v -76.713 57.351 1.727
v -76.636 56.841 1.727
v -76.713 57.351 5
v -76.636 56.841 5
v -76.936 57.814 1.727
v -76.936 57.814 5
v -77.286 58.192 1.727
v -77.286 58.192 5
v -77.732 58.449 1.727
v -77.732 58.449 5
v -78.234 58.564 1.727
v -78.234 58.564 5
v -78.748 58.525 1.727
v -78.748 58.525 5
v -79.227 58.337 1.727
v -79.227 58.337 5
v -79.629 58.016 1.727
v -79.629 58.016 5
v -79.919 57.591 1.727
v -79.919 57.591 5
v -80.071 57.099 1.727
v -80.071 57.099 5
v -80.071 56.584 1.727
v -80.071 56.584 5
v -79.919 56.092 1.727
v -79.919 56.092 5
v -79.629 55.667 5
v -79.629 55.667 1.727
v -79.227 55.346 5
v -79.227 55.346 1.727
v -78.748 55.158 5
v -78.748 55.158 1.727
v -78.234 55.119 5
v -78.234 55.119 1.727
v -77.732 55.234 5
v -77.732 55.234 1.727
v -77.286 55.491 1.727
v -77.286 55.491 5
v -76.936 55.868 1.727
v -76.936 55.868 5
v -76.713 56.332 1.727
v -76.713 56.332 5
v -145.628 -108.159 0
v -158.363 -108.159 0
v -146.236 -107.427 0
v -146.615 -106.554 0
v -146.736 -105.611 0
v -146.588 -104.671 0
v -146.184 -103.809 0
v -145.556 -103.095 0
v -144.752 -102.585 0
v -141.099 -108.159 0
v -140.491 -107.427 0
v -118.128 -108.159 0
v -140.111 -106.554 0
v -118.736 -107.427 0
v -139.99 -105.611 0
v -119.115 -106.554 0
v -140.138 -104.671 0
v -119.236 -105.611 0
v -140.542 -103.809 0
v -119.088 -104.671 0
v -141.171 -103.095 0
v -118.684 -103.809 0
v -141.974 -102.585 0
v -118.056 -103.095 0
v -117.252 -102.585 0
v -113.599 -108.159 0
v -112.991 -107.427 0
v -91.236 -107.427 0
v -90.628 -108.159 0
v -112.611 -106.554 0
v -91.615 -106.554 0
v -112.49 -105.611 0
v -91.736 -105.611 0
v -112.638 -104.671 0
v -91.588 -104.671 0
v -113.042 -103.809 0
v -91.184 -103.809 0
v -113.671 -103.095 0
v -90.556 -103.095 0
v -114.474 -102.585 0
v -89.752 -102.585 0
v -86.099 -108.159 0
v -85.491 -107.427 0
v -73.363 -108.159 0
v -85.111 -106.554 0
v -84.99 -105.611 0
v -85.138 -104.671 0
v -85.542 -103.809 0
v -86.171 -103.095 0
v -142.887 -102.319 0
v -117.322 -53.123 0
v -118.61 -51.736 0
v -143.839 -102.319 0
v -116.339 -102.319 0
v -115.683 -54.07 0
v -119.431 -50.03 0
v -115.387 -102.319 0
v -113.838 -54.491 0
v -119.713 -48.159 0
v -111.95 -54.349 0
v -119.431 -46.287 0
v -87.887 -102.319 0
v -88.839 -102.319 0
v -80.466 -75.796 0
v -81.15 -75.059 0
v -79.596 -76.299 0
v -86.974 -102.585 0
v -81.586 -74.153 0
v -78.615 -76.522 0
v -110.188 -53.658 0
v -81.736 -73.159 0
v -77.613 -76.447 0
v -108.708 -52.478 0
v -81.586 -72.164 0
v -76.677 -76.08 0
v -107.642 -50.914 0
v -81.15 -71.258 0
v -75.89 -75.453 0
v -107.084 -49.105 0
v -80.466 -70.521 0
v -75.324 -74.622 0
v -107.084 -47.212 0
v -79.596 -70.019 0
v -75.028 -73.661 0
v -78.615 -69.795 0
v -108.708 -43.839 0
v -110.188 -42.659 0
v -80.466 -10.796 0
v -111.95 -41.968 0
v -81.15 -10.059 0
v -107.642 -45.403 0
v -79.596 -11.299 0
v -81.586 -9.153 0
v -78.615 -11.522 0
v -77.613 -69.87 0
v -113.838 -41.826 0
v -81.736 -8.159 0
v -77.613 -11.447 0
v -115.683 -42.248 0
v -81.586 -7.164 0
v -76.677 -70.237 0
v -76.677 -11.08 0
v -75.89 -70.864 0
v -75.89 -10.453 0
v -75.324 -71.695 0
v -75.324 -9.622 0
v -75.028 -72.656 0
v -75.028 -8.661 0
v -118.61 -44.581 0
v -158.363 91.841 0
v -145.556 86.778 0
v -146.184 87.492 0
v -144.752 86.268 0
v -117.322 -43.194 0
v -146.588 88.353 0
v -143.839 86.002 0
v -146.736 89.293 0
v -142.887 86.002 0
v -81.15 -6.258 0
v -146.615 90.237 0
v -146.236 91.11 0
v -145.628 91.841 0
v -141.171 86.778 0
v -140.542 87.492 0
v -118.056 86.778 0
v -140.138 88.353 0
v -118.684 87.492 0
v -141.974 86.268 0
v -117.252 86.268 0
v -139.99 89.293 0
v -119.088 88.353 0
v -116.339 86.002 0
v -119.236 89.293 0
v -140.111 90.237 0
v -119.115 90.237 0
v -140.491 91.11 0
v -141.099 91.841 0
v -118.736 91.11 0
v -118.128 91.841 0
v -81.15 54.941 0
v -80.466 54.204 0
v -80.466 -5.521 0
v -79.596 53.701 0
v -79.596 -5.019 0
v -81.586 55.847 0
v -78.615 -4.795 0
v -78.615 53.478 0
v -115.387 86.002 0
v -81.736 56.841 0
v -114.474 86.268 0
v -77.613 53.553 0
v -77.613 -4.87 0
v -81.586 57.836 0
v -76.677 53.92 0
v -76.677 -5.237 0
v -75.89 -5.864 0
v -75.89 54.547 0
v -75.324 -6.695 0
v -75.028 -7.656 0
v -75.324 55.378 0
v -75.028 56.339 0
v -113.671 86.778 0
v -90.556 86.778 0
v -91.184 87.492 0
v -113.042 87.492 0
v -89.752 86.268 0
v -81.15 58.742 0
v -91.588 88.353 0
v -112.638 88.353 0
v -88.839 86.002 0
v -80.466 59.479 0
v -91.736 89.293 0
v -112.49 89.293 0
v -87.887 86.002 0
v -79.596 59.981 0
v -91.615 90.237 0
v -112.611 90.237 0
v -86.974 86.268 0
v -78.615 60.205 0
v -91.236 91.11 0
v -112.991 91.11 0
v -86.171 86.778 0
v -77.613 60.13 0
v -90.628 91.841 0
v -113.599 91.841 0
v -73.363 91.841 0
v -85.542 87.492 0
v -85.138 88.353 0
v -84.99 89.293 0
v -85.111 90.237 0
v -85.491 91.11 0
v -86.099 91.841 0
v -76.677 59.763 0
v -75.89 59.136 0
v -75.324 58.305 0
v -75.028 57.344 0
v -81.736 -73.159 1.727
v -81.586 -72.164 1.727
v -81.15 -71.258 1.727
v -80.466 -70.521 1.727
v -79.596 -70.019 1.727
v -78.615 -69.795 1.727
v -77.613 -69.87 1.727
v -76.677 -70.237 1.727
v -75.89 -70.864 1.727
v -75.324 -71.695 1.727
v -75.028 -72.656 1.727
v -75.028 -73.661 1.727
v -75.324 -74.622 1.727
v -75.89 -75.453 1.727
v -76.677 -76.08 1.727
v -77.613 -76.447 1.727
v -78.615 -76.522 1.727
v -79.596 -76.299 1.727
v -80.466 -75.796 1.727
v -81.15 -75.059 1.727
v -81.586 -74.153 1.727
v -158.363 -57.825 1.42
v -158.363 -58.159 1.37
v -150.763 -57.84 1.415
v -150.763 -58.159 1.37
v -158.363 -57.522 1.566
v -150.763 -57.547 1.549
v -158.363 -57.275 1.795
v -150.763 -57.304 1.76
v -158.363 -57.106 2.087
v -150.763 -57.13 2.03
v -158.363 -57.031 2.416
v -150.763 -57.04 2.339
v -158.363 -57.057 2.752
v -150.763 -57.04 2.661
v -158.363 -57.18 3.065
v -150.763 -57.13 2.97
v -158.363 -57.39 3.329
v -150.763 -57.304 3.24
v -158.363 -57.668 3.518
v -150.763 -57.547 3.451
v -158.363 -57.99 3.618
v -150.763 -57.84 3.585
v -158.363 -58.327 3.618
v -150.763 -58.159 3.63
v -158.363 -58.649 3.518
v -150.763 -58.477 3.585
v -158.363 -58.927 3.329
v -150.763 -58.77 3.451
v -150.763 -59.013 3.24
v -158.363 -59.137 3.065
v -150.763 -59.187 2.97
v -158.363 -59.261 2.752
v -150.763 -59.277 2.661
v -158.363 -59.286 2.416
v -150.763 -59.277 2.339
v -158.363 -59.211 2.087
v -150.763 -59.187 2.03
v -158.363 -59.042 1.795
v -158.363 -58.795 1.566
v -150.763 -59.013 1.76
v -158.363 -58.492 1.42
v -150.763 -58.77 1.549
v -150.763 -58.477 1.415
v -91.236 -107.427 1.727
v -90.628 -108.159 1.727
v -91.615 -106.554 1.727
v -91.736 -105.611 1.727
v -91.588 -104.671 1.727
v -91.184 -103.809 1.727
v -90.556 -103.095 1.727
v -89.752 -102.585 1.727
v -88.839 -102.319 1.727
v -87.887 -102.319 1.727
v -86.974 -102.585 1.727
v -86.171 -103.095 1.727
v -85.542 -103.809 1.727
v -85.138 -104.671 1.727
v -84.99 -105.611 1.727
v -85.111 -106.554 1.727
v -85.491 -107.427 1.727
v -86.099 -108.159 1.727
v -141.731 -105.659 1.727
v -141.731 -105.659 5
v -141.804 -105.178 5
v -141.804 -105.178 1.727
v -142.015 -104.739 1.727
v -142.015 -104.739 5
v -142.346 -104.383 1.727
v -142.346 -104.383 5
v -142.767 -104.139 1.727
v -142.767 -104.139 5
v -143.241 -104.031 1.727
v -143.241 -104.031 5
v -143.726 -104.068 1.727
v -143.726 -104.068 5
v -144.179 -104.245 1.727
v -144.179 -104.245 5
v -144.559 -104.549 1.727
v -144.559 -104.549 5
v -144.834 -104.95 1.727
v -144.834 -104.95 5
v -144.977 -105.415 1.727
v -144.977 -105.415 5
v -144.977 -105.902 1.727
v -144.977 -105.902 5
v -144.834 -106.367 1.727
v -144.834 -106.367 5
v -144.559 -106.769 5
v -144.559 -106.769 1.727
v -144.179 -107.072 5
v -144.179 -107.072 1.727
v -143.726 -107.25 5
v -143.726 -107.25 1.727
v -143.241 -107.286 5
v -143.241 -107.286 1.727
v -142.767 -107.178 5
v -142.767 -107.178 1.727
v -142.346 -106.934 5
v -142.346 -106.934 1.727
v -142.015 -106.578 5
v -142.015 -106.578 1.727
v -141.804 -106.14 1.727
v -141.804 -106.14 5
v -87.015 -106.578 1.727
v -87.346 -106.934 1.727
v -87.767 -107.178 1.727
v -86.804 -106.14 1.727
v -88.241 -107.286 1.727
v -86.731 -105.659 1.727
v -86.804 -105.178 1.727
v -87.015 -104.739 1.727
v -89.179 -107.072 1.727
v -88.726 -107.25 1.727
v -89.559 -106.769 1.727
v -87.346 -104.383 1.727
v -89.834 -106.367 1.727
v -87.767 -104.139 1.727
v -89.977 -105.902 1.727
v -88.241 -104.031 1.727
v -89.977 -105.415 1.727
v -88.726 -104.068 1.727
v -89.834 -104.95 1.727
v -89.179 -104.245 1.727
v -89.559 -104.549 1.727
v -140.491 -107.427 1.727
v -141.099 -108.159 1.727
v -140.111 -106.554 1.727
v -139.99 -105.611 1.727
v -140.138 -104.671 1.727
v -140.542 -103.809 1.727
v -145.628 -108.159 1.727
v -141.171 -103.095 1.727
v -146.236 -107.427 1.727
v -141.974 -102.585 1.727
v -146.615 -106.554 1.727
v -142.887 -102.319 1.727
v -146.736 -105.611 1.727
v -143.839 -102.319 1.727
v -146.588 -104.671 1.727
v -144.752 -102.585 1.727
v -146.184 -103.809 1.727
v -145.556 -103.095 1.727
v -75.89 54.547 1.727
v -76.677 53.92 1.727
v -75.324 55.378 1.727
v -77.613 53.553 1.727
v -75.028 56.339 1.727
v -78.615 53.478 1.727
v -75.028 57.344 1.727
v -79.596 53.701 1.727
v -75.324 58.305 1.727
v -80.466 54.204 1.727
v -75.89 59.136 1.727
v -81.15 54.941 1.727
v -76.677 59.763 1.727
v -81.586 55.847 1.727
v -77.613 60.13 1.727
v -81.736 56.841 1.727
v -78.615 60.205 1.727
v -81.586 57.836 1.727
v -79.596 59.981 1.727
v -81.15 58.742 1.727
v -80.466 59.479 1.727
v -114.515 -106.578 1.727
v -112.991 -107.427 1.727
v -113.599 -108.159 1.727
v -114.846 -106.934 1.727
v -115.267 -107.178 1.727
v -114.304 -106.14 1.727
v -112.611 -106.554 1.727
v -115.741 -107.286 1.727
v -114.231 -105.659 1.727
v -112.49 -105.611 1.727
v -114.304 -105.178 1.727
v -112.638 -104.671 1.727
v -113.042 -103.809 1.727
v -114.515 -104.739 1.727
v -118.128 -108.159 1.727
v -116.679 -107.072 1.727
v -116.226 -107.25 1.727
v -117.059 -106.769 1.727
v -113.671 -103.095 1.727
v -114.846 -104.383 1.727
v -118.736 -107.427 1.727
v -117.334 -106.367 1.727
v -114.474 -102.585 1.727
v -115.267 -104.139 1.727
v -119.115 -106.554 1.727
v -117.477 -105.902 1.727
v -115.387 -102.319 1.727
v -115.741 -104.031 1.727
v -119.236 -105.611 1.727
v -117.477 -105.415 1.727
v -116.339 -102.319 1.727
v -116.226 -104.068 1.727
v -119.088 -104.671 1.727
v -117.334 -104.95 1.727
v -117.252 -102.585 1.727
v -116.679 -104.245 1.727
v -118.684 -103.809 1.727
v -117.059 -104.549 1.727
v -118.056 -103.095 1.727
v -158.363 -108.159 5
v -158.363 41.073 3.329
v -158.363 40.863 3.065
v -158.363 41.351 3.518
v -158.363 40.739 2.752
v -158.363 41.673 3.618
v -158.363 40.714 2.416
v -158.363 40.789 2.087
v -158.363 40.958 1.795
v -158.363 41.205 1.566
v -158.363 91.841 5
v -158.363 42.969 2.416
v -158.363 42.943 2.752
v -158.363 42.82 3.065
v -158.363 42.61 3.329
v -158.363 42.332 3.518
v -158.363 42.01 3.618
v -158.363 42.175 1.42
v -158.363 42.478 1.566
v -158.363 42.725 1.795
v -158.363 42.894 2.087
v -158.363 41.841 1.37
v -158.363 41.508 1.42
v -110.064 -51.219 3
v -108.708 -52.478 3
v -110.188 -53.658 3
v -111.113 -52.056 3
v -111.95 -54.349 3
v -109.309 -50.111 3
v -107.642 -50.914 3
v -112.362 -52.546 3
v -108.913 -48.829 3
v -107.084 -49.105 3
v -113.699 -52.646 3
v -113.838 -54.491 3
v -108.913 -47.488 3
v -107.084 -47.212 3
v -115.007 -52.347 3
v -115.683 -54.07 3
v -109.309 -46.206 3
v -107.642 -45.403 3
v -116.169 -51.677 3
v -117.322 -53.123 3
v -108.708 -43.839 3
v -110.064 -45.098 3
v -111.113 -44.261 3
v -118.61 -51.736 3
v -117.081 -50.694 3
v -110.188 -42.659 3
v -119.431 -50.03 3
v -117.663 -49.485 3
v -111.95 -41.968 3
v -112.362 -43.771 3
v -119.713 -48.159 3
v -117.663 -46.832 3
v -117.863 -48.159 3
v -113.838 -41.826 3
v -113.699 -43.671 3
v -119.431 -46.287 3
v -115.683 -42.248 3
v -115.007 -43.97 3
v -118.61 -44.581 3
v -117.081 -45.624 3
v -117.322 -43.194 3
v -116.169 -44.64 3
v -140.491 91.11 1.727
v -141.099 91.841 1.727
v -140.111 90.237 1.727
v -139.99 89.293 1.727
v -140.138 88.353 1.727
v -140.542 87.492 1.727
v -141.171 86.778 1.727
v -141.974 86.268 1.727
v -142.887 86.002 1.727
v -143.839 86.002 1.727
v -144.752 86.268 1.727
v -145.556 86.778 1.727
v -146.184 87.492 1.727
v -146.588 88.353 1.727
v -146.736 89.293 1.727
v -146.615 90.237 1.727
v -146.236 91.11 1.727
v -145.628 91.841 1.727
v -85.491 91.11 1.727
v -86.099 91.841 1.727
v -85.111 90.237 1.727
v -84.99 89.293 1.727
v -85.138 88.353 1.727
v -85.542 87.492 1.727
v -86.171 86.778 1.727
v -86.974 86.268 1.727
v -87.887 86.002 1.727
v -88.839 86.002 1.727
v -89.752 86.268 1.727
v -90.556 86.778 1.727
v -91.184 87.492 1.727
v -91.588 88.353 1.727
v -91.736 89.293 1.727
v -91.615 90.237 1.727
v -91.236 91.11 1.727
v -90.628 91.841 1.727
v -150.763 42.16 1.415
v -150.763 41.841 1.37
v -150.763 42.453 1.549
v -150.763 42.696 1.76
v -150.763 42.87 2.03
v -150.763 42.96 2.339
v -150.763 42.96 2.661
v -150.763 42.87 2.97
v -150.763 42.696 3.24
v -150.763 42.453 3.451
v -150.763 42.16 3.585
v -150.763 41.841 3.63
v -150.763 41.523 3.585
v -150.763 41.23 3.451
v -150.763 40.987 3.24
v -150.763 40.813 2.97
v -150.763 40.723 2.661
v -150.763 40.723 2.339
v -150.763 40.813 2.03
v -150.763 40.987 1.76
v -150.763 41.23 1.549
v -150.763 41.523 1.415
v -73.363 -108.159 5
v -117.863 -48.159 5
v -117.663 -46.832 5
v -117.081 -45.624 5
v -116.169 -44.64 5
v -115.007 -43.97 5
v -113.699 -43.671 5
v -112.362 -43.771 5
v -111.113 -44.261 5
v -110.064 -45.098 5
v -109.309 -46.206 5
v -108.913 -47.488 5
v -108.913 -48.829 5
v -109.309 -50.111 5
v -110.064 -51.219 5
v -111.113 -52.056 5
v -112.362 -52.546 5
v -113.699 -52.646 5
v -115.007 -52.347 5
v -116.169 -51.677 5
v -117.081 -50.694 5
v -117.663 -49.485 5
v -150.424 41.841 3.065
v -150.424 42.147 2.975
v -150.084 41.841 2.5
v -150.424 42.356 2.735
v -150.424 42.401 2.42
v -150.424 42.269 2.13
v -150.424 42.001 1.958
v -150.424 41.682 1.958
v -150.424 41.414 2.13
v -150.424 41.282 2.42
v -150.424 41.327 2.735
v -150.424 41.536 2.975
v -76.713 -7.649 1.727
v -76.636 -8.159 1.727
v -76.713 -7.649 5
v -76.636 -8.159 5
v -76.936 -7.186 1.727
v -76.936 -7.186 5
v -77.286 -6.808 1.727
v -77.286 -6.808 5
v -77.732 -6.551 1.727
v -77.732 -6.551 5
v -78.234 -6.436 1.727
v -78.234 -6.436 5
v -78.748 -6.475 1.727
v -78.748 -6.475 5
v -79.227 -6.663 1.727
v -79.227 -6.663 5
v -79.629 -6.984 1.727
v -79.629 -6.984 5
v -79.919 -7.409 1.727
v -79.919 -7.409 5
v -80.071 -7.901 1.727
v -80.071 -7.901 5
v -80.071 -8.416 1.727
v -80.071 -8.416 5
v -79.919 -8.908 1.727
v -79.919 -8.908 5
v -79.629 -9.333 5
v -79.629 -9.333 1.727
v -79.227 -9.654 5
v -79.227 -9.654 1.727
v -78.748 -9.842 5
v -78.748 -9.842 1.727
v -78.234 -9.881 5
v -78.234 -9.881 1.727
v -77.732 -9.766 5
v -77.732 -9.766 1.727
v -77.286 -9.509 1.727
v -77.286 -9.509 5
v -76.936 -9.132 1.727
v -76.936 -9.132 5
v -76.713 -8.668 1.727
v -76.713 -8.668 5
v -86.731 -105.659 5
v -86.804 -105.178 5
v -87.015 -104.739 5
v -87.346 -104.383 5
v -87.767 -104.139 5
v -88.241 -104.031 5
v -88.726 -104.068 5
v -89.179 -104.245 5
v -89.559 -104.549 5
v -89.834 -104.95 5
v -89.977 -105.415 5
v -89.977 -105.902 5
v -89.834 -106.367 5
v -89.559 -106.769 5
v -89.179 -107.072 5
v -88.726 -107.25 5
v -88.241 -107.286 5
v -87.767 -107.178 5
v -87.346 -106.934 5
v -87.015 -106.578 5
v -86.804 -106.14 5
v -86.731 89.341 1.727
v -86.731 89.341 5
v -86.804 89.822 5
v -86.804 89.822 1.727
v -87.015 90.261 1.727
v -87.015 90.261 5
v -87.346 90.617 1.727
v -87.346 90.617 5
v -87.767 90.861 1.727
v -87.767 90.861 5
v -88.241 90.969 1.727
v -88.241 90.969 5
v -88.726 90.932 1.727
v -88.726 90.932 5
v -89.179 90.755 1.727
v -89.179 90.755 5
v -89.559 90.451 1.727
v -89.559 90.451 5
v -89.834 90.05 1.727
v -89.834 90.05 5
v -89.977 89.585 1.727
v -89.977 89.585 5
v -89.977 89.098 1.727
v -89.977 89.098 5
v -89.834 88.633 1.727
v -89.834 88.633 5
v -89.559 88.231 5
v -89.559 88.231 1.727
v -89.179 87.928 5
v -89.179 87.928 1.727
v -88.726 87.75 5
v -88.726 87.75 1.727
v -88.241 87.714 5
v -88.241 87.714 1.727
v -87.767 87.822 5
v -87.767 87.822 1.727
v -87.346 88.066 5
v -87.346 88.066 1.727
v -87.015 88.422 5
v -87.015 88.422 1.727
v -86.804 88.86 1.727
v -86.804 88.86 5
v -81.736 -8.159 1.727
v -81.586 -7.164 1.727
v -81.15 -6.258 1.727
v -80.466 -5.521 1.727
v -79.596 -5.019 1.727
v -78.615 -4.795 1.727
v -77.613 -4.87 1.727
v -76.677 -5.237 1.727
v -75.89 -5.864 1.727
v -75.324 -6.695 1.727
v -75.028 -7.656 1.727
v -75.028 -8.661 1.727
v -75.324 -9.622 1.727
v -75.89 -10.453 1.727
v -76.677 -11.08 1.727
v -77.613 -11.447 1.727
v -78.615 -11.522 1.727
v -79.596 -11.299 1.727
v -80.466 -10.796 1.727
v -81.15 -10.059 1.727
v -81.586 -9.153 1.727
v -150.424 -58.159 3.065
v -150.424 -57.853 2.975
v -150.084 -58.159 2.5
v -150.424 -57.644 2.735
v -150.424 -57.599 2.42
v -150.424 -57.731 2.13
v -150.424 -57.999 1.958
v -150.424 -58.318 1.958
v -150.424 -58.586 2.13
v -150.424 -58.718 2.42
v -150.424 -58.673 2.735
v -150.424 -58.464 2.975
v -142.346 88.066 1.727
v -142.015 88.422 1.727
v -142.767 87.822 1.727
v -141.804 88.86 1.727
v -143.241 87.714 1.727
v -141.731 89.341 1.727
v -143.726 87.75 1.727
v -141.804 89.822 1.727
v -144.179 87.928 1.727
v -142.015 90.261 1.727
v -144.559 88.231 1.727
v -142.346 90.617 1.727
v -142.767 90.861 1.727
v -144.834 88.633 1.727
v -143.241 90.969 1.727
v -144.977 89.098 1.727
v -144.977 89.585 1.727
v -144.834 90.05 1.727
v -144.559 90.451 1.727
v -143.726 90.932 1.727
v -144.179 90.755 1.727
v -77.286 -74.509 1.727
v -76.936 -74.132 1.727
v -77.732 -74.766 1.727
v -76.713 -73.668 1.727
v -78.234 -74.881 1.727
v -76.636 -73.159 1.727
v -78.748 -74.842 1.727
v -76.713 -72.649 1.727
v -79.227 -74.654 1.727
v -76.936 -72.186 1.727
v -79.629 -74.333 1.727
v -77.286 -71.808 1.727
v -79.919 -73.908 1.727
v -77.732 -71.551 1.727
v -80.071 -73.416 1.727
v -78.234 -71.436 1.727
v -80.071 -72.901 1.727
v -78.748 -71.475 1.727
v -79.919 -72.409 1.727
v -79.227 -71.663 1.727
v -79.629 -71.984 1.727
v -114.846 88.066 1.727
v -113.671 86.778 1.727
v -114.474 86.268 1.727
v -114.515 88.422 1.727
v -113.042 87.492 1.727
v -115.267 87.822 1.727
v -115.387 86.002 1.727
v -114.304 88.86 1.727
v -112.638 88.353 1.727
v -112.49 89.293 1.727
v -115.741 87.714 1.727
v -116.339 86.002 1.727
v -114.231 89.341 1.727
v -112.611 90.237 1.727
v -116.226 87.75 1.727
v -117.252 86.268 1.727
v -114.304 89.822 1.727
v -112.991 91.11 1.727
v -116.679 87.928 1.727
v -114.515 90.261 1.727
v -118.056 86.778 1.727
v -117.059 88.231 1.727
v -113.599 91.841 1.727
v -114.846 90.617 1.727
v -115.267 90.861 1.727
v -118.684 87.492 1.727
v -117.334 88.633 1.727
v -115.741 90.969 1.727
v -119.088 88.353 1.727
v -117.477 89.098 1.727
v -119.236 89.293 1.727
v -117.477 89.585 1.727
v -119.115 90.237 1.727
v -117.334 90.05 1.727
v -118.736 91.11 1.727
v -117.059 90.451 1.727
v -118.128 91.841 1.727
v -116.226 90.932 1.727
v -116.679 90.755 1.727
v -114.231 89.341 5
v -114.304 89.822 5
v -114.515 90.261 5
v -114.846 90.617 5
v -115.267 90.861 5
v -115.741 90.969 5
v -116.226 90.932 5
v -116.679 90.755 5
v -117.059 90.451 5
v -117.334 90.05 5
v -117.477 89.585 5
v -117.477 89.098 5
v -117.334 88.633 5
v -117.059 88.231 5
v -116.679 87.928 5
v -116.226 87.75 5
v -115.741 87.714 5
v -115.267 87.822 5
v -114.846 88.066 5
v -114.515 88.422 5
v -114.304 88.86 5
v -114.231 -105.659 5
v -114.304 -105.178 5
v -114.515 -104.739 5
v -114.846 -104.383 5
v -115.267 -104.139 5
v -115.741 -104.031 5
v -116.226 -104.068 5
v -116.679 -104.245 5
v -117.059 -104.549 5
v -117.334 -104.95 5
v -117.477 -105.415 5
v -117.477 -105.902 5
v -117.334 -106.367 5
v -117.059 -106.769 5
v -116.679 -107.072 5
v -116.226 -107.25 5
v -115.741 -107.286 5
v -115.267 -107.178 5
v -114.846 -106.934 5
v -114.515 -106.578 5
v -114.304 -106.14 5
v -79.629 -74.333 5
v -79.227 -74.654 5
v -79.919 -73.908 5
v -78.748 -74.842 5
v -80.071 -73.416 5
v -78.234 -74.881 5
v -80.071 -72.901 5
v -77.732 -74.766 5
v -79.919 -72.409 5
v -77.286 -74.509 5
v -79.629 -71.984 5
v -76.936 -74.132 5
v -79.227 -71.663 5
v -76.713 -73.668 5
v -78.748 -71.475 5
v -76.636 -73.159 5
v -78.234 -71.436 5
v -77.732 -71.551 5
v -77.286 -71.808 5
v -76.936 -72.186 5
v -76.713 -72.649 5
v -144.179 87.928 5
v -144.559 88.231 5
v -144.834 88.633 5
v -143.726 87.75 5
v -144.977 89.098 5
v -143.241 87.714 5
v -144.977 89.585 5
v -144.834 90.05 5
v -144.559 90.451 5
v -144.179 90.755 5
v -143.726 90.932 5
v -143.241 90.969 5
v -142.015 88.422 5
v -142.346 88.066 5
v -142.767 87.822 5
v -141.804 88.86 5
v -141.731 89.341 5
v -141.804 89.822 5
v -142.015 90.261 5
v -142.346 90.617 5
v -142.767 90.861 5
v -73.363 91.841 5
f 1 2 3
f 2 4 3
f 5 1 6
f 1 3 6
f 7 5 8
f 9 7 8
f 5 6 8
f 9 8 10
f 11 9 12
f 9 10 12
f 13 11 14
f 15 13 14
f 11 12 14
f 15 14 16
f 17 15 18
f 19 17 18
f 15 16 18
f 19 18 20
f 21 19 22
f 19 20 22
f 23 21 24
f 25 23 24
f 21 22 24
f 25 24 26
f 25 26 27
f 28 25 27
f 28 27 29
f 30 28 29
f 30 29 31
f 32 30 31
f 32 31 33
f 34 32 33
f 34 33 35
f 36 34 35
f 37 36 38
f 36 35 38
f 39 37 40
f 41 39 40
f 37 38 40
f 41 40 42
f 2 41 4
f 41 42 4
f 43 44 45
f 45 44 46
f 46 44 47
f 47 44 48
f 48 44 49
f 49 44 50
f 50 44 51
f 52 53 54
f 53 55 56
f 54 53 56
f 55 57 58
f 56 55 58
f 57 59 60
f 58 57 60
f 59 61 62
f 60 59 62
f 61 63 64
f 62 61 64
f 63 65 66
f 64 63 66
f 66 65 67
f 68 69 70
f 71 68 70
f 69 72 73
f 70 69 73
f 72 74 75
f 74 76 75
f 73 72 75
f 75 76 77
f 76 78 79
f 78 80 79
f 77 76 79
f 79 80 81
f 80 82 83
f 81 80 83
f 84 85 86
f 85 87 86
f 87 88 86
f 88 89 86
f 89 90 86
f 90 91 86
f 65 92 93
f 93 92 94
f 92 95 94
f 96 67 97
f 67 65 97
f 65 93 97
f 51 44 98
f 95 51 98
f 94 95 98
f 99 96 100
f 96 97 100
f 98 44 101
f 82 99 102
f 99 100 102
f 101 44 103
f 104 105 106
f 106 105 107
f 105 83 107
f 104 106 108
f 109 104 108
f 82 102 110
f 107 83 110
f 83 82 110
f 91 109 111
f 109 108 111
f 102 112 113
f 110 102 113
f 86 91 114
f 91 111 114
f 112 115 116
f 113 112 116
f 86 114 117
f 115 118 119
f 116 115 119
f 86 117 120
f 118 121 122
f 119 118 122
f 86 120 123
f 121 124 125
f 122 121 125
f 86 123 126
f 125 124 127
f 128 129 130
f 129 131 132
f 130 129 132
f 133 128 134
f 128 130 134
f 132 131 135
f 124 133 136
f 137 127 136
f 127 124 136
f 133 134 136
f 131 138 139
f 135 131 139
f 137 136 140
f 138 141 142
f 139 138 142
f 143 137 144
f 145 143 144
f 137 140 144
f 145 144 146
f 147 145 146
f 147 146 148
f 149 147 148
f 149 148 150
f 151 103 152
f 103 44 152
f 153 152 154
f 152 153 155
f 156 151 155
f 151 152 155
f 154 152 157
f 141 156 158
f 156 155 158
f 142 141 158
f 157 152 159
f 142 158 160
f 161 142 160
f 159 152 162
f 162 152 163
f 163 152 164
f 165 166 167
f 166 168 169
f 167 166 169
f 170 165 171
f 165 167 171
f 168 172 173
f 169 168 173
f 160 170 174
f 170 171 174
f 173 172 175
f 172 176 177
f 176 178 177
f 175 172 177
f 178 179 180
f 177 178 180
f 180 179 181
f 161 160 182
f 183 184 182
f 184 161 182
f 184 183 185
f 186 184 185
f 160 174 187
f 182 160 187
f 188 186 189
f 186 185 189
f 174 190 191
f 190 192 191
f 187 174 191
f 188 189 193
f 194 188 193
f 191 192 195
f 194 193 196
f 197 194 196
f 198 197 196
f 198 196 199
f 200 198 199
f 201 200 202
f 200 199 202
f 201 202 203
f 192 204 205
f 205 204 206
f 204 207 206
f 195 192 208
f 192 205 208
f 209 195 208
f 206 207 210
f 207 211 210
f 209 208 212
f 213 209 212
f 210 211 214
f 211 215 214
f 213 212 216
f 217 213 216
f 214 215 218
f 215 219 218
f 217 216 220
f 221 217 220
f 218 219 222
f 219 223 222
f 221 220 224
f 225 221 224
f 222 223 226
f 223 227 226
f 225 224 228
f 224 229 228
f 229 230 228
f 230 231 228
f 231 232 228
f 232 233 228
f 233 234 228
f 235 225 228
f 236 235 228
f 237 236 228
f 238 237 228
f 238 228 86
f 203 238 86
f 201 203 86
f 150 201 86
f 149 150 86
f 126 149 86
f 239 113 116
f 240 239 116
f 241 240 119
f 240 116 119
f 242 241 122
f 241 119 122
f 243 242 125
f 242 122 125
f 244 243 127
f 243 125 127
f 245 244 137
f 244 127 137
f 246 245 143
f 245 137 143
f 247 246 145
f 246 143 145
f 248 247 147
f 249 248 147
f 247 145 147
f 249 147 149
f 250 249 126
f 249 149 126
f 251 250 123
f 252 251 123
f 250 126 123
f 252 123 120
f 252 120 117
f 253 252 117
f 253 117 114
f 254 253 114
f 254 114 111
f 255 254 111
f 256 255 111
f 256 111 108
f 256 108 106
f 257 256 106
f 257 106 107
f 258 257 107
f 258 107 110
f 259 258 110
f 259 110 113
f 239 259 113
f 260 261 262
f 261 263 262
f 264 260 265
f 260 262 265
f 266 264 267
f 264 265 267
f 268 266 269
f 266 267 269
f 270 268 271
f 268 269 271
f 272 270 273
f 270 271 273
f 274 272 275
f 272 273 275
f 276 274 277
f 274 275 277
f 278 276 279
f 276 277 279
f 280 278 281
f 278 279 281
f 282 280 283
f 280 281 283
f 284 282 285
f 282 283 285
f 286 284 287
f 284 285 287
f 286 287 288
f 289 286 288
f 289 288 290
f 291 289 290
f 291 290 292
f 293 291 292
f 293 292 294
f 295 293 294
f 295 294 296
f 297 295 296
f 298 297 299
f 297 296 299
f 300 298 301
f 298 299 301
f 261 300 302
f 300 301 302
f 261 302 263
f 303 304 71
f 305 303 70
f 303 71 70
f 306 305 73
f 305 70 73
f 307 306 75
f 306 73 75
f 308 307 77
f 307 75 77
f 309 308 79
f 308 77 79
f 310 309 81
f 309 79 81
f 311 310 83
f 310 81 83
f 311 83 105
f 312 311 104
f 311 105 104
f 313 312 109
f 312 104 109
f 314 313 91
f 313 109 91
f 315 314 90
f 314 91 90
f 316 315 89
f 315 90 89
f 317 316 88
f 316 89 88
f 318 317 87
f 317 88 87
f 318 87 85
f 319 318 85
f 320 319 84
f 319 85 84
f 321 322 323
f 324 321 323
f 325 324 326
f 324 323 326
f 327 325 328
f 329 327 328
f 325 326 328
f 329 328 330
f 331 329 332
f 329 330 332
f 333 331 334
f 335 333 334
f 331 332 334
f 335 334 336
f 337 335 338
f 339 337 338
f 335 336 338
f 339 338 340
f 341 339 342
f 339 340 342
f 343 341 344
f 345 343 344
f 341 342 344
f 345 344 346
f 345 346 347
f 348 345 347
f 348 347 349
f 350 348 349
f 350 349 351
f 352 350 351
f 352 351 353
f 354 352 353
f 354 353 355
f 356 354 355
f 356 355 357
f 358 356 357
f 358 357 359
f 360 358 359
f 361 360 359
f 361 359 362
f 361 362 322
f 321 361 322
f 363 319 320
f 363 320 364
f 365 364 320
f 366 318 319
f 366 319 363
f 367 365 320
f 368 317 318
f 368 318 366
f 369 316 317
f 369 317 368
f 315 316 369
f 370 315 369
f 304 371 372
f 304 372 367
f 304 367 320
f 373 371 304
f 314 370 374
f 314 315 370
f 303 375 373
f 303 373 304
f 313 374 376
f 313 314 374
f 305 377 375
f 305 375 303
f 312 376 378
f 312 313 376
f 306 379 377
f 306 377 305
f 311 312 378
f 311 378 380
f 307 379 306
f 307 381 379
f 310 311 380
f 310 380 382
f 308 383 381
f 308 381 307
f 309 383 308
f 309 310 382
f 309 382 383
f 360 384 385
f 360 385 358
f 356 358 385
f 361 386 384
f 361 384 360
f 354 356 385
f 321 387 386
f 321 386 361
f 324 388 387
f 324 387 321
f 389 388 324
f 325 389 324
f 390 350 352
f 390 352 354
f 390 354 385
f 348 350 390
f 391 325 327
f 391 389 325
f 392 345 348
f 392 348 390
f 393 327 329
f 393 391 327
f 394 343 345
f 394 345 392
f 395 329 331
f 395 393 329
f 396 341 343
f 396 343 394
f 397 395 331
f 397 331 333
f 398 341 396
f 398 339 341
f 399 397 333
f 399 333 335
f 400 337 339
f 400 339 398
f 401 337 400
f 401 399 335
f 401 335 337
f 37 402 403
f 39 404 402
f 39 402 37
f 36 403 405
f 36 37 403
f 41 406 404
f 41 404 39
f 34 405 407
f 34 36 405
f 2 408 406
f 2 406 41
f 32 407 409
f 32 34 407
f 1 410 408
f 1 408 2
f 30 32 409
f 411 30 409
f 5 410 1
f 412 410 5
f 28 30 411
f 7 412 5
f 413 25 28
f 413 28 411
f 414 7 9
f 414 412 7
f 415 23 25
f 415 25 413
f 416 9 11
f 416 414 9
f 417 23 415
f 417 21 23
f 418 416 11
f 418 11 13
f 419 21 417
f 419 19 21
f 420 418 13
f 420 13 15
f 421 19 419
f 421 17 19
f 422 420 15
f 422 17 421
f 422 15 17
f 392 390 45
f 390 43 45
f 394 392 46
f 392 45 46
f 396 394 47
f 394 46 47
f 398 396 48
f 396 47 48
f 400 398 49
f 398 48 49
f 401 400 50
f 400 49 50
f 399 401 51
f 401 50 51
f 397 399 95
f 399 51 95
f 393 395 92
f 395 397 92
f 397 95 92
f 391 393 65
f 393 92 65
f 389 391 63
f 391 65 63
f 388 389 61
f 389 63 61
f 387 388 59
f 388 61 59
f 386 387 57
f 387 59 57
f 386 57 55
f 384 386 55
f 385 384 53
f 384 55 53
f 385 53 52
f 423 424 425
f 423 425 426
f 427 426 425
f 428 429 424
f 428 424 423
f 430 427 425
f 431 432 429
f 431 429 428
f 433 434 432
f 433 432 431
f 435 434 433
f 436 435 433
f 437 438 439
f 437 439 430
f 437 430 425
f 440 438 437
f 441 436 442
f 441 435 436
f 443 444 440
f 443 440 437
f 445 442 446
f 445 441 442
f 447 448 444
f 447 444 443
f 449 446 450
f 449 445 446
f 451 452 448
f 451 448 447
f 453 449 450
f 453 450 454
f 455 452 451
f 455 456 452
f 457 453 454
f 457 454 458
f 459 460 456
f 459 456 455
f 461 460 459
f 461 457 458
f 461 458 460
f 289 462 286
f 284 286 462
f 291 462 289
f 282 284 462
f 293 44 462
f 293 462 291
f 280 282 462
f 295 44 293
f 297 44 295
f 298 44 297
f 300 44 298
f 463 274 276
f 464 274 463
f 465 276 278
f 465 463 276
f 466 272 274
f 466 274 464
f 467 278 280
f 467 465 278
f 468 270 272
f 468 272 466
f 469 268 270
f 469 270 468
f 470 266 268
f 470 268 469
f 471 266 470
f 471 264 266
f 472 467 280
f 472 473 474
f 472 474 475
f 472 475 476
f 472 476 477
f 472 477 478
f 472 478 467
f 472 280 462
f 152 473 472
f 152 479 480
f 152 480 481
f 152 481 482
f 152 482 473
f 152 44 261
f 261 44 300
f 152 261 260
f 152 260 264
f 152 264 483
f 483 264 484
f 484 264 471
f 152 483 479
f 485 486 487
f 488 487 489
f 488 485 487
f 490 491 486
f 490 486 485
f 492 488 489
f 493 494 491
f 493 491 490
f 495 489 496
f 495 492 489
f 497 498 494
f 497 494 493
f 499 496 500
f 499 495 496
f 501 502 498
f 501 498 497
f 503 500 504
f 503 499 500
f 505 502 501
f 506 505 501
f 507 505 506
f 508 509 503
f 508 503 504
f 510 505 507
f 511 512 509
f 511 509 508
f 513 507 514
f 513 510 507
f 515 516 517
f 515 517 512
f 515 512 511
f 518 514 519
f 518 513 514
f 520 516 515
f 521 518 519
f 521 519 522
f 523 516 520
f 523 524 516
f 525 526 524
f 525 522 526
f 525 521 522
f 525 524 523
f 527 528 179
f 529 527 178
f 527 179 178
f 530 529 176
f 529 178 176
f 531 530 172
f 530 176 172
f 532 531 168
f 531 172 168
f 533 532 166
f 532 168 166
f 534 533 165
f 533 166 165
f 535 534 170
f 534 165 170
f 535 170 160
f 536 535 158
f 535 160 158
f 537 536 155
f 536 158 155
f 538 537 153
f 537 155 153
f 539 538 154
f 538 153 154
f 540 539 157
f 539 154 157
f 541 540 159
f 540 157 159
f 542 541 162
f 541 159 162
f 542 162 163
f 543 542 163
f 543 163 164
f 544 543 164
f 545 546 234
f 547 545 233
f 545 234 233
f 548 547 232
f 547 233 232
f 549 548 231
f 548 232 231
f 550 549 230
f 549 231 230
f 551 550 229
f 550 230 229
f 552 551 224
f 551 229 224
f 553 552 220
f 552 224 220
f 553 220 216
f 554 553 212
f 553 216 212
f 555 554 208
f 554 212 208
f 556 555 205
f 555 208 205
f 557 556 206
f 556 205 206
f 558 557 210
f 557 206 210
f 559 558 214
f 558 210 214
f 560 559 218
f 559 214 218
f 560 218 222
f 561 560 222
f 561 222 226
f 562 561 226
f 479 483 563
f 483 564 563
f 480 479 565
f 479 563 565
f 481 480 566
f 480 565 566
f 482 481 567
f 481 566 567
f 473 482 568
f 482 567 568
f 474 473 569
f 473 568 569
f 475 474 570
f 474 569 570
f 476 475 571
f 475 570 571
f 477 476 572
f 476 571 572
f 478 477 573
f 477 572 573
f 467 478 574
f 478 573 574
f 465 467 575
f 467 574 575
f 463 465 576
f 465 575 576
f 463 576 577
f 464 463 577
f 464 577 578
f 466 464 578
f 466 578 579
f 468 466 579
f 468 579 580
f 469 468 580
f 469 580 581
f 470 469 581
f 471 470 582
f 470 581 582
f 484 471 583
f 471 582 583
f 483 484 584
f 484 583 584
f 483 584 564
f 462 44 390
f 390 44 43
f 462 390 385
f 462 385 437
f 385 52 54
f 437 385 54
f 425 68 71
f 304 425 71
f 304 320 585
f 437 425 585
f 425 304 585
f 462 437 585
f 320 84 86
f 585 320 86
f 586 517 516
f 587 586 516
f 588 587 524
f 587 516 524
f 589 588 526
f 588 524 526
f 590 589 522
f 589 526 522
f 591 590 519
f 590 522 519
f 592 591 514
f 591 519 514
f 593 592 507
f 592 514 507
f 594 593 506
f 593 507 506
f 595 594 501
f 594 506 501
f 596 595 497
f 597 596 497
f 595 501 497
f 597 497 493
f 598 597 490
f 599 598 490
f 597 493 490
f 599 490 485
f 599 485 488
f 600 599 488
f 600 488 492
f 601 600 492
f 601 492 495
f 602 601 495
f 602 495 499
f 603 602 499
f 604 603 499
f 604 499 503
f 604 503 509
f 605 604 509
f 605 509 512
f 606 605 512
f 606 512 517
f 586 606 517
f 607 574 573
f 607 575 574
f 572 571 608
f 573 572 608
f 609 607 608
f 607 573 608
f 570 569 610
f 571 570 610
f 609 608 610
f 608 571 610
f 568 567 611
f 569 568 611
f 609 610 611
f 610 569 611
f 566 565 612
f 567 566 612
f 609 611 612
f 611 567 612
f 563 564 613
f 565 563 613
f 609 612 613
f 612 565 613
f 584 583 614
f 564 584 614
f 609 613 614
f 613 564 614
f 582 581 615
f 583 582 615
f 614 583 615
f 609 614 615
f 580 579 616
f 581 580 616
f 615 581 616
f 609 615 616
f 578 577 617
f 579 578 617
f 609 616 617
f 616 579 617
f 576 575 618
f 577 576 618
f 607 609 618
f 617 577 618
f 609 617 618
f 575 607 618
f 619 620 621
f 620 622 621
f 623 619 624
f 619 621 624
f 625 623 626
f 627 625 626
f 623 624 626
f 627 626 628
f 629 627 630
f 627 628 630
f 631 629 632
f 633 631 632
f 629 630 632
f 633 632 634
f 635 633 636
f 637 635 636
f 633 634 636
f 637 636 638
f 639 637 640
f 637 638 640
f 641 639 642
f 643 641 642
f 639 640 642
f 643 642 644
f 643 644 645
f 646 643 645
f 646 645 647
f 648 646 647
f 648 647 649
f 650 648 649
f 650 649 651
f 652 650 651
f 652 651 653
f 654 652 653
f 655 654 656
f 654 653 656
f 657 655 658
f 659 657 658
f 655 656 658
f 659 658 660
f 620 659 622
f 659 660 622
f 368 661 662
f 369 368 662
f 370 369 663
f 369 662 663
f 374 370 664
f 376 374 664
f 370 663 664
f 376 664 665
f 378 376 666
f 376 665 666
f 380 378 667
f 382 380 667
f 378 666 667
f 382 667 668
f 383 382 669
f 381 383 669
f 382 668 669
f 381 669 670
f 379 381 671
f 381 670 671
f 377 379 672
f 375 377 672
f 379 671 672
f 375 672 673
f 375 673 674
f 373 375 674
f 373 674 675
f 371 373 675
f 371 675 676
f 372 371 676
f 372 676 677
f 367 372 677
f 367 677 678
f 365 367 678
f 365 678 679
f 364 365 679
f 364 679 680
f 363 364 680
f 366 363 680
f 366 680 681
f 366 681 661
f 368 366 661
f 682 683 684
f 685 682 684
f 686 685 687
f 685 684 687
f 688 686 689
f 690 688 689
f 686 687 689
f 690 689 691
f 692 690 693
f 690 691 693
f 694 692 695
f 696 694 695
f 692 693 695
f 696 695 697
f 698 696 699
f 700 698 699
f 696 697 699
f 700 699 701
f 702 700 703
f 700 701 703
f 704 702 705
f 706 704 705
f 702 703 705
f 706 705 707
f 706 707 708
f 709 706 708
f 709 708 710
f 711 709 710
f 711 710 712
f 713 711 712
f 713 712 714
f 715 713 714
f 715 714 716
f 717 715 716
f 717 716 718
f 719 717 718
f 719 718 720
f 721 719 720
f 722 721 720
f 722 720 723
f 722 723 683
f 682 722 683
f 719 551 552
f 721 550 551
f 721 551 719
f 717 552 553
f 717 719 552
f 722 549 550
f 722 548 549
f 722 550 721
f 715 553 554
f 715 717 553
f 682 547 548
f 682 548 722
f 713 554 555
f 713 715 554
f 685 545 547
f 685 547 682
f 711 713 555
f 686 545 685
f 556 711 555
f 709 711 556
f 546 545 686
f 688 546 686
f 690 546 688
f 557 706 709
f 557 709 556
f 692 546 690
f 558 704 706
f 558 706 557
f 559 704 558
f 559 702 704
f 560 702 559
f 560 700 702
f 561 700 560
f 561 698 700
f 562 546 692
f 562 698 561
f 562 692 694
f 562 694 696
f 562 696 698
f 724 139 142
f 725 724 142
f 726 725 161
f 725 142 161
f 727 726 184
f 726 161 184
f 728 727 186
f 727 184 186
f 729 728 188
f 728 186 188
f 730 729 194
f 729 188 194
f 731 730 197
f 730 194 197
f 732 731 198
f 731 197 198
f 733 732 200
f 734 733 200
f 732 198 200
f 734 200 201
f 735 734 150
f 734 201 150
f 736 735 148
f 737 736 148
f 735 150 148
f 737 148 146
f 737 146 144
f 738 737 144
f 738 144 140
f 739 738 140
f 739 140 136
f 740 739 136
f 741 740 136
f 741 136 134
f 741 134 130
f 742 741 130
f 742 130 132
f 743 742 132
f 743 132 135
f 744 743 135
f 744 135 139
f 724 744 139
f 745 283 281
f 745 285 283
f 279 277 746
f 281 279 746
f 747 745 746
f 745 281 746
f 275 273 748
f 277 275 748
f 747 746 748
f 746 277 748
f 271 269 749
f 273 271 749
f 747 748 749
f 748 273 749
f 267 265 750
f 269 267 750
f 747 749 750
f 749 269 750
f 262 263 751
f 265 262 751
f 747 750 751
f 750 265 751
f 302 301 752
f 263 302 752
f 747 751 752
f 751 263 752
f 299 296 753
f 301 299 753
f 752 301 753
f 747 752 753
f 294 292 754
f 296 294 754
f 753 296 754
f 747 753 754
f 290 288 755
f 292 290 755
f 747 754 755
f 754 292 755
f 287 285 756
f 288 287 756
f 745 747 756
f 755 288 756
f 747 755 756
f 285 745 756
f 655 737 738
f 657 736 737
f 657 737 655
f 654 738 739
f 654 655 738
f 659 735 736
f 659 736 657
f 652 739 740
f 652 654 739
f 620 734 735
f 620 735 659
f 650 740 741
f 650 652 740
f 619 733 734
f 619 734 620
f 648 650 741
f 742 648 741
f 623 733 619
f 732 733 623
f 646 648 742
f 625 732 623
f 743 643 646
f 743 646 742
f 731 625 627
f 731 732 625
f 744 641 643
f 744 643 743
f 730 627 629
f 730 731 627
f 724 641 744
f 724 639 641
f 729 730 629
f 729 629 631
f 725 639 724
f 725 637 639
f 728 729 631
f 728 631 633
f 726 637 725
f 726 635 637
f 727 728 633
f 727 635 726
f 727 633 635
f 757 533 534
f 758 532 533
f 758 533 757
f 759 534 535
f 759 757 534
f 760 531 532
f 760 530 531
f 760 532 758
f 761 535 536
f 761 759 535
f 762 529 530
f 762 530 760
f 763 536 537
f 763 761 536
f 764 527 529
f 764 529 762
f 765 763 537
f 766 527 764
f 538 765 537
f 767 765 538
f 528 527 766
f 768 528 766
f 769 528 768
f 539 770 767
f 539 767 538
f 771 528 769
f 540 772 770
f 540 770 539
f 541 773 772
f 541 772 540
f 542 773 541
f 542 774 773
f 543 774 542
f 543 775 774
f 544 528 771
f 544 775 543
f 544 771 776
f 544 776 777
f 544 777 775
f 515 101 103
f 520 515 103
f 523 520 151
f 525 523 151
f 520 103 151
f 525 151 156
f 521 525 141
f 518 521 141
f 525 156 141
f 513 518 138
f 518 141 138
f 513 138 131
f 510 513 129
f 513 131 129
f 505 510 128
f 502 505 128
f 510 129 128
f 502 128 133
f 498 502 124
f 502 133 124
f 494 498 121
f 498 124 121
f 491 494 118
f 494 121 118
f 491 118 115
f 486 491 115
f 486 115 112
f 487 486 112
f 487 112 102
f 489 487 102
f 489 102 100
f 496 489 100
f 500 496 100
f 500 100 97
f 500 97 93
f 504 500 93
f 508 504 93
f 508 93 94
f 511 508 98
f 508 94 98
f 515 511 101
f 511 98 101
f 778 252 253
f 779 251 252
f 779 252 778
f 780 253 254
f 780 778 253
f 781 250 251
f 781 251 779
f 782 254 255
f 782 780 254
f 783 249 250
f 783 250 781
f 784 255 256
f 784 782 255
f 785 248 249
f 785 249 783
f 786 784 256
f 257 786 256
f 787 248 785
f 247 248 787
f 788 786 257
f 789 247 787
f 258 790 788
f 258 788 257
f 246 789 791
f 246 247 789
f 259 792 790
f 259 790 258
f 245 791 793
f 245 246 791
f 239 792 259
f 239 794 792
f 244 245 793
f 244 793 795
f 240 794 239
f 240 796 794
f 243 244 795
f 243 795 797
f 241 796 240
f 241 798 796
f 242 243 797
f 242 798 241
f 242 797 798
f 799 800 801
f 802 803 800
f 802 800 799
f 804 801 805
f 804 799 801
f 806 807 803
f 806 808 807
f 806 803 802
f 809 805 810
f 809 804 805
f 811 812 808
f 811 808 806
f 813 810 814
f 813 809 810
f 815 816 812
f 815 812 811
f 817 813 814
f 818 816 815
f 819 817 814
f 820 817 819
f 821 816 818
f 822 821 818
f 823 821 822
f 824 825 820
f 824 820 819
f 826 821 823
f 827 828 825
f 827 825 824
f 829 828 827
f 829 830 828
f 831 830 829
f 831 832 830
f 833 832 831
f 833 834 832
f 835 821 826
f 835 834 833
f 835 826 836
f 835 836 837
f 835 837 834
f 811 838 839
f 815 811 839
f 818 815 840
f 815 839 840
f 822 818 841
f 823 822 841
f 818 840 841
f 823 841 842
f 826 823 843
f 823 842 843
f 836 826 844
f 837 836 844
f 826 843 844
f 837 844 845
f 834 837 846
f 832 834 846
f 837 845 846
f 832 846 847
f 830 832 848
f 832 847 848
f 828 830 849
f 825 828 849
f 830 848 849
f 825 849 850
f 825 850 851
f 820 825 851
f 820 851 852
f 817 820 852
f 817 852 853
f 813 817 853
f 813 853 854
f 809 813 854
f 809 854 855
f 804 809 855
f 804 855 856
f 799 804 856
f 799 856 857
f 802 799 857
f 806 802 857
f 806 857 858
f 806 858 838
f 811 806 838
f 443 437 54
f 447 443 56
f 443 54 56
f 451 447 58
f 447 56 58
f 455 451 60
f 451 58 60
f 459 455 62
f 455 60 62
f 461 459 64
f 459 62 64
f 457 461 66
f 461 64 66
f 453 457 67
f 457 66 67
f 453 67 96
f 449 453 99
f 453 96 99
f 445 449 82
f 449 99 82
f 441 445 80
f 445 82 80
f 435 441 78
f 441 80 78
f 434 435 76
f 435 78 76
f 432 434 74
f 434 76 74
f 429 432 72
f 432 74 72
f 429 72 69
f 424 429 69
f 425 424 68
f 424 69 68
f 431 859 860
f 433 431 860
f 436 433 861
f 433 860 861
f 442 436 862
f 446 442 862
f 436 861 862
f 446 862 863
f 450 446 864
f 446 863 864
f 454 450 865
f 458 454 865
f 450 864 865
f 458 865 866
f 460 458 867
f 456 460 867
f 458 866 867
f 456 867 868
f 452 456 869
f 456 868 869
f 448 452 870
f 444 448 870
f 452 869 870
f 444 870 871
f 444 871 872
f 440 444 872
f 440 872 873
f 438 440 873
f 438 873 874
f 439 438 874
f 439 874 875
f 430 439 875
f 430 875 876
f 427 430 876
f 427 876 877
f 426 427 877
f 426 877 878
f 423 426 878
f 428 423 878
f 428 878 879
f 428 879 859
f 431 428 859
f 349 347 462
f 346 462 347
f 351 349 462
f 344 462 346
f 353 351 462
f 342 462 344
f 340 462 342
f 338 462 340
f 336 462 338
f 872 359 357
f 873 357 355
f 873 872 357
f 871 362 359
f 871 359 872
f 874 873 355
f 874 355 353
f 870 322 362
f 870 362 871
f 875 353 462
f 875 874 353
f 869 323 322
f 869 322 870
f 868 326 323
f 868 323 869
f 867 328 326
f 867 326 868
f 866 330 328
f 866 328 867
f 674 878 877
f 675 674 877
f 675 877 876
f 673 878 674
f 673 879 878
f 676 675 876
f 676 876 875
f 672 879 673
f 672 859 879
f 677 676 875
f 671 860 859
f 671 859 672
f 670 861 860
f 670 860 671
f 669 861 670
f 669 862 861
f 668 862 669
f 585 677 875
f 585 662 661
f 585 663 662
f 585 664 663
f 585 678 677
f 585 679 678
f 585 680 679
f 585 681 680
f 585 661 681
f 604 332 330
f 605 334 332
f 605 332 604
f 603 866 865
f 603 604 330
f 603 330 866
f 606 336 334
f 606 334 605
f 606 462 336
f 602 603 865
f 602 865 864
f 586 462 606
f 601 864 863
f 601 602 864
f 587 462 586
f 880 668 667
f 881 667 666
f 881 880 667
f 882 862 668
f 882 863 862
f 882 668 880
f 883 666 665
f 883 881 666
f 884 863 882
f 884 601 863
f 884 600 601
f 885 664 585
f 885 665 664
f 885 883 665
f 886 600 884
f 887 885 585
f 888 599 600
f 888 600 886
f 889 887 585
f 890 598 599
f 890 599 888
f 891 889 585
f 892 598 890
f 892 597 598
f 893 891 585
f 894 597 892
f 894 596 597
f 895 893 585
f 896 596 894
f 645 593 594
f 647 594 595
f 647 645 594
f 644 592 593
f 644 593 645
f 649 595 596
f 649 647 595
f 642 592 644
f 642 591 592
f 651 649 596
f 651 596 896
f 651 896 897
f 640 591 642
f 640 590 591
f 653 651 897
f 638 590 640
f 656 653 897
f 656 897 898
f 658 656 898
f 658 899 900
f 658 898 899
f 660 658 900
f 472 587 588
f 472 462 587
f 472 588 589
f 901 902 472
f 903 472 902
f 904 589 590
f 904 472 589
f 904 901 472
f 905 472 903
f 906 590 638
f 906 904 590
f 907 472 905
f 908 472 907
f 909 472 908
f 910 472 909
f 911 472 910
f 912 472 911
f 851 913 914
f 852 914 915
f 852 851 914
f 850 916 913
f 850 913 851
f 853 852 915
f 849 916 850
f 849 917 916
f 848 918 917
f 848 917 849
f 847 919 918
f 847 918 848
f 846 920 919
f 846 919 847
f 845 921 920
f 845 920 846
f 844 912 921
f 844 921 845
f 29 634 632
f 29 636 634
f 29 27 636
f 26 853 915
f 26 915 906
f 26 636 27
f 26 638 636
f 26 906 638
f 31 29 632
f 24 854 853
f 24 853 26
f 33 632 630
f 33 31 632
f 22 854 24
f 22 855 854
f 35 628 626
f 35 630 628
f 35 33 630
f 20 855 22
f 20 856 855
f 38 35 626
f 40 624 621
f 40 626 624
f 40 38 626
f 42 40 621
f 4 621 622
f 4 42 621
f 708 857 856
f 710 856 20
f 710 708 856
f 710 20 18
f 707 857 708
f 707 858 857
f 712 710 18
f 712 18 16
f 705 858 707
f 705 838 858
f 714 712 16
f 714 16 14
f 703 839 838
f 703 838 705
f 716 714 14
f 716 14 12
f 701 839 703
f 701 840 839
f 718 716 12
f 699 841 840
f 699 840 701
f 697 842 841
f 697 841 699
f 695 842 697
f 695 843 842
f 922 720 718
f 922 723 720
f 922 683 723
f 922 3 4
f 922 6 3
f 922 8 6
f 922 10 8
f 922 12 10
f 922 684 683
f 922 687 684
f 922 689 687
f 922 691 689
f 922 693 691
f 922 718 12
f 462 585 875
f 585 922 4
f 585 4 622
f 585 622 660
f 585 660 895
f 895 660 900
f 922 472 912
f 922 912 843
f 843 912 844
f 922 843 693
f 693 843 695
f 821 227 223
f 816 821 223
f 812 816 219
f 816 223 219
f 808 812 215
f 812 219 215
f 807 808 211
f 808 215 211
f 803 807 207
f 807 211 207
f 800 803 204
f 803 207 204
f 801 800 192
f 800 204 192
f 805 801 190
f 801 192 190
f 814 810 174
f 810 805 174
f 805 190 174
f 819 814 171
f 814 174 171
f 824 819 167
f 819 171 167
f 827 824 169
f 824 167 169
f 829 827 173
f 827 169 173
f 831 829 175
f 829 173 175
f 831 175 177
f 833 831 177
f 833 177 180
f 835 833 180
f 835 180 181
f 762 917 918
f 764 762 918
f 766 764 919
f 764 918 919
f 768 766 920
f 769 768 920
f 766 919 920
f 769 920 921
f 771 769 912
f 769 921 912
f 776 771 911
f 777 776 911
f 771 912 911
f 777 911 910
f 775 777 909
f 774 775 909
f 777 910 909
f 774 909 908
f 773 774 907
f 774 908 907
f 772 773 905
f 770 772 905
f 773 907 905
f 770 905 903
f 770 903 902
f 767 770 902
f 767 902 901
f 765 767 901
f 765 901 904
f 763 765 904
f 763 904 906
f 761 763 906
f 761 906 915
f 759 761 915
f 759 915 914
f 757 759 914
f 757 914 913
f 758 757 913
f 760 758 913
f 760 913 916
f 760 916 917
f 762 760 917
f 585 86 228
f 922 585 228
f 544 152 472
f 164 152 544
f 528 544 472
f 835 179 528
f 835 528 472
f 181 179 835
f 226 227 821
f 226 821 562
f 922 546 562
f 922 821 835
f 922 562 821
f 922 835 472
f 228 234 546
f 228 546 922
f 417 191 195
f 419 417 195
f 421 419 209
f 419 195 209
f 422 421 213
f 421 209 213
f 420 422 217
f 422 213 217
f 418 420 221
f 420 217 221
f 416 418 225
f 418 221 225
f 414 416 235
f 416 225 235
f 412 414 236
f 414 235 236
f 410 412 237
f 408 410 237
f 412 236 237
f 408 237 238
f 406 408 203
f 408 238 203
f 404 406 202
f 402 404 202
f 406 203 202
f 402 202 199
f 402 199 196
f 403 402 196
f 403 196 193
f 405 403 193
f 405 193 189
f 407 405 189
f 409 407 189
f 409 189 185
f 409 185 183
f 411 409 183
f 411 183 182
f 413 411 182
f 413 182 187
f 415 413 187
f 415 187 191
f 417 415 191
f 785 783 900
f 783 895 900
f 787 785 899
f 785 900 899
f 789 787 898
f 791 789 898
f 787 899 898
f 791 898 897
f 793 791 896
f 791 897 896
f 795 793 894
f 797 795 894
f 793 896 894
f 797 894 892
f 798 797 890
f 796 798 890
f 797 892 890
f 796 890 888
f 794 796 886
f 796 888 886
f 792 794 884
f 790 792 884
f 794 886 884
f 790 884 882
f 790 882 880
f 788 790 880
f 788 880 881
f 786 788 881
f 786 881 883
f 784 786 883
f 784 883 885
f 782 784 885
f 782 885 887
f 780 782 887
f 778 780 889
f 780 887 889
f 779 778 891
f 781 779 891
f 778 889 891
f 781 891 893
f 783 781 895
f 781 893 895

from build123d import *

# Parameters (mm, degrees)
SKETCH1_W                                           = 85
SKETCH1_H                                           = 200
BOSS_EXTRUDE1_DEPTH                                 = 5
CBORE_FOR_4_BINDING_HEAD_MACHINE_SCREW1_D           = 3.4544
CBORE_FOR_4_BINDING_HEAD_MACHINE_SCREW1_CBORE_D     = 6.74624
CBORE_FOR_4_BINDING_HEAD_MACHINE_SCREW1_CBORE_DEPTH = 1.7272
CBORE_FOR_4_BINDING_HEAD_MACHINE_SCREW2_D           = 3.2639
CBORE_FOR_4_BINDING_HEAD_MACHINE_SCREW2_DEPTH       = 5
CBORE_FOR_4_BINDING_HEAD_MACHINE_SCREW2_CBORE_D     = 6.74624
CBORE_FOR_4_BINDING_HEAD_MACHINE_SCREW2_CBORE_DEPTH = 1.7272
F_4_40_TAPPED_HOLE2_D                               = 2.2606
F_4_40_TAPPED_HOLE2_DEPTH                           = 7.6
F_4_40_TAPPED_HOLE2_TIP                             = 0.679152758
SKETCH10_R                                          = 4.5
CUT_EXTRUDE2_DEPTH                                  = 6
SKETCH10_6_R                                        = 6.35
CUT_EXTRUDE3_DEPTH                                  = 3


with BuildPart() as part:
    # Sketch1 → Boss-Extrude1 (new body)
    with BuildSketch(Plane.XY):
        with Locations((-115.863171355, -8.158567775)):
            Rectangle(SKETCH1_W, SKETCH1_H)
    extrude(amount=BOSS_EXTRUDE1_DEPTH)

    # CBORE for #4 Binding Head Machine Screw1 (through all)
    with Locations(Plane(origin=(0, 0, 0), x_dir=(-1, 0, 0), z_dir=(0, 0, -1))):
        with Locations((78.363171355, 56.841432225), (78.363171355, -8.158567775), (78.363171355, -73.158567775)):
            CounterBoreHole(CBORE_FOR_4_BINDING_HEAD_MACHINE_SCREW1_D / 2, CBORE_FOR_4_BINDING_HEAD_MACHINE_SCREW1_CBORE_D / 2, CBORE_FOR_4_BINDING_HEAD_MACHINE_SCREW1_CBORE_DEPTH)

    # CBORE for #4 Binding Head Machine Screw2
    with Locations(Plane(origin=(0, 0, 0), x_dir=(-1, 0, 0), z_dir=(0, 0, -1))):
        with Locations((88.363171355, 89.341432225), (115.863171355, 89.341432225), (143.363171355, 89.341432225), (143.363171355, -105.658567775), (115.863171355, -105.658567775), (88.363171355, -105.658567775)):
            CounterBoreHole(CBORE_FOR_4_BINDING_HEAD_MACHINE_SCREW2_D / 2, CBORE_FOR_4_BINDING_HEAD_MACHINE_SCREW2_CBORE_D / 2, CBORE_FOR_4_BINDING_HEAD_MACHINE_SCREW2_CBORE_DEPTH, depth=CBORE_FOR_4_BINDING_HEAD_MACHINE_SCREW2_DEPTH)

    # #4-40 Tapped Hole2
    with Locations(Plane.ZY.offset(158.363171355)):
        with Locations((2.5, -58.158567775), (2.5, 41.841432225)):
            Hole(F_4_40_TAPPED_HOLE2_D / 2, depth=F_4_40_TAPPED_HOLE2_DEPTH)
            with Locations((0, 0, -(F_4_40_TAPPED_HOLE2_DEPTH + F_4_40_TAPPED_HOLE2_TIP / 2))):  # 118° drill point
                Cone(0, F_4_40_TAPPED_HOLE2_D / 2, F_4_40_TAPPED_HOLE2_TIP, mode=Mode.SUBTRACT)

    # Sketch10 → Cut-Extrude2 (cut, through all)
    with BuildSketch(Plane(origin=(0, 0, 0), x_dir=(-1, 0, 0), z_dir=(0, 0, -1))):
        with Locations((113.363171355, -48.158567775)):
            Circle(SKETCH10_R)
    extrude(amount=-CUT_EXTRUDE2_DEPTH, mode=Mode.SUBTRACT)

    # Sketch10<6> → Cut-Extrude3 (cut)
    with BuildSketch(Plane(origin=(0, 0, 0), x_dir=(-1, 0, 0), z_dir=(0, 0, -1))):
        with Locations((113.363171355, -48.158567775)):
            Circle(SKETCH10_6_R)
    extrude(amount=-CUT_EXTRUDE3_DEPTH, mode=Mode.SUBTRACT)


solid = part.part
